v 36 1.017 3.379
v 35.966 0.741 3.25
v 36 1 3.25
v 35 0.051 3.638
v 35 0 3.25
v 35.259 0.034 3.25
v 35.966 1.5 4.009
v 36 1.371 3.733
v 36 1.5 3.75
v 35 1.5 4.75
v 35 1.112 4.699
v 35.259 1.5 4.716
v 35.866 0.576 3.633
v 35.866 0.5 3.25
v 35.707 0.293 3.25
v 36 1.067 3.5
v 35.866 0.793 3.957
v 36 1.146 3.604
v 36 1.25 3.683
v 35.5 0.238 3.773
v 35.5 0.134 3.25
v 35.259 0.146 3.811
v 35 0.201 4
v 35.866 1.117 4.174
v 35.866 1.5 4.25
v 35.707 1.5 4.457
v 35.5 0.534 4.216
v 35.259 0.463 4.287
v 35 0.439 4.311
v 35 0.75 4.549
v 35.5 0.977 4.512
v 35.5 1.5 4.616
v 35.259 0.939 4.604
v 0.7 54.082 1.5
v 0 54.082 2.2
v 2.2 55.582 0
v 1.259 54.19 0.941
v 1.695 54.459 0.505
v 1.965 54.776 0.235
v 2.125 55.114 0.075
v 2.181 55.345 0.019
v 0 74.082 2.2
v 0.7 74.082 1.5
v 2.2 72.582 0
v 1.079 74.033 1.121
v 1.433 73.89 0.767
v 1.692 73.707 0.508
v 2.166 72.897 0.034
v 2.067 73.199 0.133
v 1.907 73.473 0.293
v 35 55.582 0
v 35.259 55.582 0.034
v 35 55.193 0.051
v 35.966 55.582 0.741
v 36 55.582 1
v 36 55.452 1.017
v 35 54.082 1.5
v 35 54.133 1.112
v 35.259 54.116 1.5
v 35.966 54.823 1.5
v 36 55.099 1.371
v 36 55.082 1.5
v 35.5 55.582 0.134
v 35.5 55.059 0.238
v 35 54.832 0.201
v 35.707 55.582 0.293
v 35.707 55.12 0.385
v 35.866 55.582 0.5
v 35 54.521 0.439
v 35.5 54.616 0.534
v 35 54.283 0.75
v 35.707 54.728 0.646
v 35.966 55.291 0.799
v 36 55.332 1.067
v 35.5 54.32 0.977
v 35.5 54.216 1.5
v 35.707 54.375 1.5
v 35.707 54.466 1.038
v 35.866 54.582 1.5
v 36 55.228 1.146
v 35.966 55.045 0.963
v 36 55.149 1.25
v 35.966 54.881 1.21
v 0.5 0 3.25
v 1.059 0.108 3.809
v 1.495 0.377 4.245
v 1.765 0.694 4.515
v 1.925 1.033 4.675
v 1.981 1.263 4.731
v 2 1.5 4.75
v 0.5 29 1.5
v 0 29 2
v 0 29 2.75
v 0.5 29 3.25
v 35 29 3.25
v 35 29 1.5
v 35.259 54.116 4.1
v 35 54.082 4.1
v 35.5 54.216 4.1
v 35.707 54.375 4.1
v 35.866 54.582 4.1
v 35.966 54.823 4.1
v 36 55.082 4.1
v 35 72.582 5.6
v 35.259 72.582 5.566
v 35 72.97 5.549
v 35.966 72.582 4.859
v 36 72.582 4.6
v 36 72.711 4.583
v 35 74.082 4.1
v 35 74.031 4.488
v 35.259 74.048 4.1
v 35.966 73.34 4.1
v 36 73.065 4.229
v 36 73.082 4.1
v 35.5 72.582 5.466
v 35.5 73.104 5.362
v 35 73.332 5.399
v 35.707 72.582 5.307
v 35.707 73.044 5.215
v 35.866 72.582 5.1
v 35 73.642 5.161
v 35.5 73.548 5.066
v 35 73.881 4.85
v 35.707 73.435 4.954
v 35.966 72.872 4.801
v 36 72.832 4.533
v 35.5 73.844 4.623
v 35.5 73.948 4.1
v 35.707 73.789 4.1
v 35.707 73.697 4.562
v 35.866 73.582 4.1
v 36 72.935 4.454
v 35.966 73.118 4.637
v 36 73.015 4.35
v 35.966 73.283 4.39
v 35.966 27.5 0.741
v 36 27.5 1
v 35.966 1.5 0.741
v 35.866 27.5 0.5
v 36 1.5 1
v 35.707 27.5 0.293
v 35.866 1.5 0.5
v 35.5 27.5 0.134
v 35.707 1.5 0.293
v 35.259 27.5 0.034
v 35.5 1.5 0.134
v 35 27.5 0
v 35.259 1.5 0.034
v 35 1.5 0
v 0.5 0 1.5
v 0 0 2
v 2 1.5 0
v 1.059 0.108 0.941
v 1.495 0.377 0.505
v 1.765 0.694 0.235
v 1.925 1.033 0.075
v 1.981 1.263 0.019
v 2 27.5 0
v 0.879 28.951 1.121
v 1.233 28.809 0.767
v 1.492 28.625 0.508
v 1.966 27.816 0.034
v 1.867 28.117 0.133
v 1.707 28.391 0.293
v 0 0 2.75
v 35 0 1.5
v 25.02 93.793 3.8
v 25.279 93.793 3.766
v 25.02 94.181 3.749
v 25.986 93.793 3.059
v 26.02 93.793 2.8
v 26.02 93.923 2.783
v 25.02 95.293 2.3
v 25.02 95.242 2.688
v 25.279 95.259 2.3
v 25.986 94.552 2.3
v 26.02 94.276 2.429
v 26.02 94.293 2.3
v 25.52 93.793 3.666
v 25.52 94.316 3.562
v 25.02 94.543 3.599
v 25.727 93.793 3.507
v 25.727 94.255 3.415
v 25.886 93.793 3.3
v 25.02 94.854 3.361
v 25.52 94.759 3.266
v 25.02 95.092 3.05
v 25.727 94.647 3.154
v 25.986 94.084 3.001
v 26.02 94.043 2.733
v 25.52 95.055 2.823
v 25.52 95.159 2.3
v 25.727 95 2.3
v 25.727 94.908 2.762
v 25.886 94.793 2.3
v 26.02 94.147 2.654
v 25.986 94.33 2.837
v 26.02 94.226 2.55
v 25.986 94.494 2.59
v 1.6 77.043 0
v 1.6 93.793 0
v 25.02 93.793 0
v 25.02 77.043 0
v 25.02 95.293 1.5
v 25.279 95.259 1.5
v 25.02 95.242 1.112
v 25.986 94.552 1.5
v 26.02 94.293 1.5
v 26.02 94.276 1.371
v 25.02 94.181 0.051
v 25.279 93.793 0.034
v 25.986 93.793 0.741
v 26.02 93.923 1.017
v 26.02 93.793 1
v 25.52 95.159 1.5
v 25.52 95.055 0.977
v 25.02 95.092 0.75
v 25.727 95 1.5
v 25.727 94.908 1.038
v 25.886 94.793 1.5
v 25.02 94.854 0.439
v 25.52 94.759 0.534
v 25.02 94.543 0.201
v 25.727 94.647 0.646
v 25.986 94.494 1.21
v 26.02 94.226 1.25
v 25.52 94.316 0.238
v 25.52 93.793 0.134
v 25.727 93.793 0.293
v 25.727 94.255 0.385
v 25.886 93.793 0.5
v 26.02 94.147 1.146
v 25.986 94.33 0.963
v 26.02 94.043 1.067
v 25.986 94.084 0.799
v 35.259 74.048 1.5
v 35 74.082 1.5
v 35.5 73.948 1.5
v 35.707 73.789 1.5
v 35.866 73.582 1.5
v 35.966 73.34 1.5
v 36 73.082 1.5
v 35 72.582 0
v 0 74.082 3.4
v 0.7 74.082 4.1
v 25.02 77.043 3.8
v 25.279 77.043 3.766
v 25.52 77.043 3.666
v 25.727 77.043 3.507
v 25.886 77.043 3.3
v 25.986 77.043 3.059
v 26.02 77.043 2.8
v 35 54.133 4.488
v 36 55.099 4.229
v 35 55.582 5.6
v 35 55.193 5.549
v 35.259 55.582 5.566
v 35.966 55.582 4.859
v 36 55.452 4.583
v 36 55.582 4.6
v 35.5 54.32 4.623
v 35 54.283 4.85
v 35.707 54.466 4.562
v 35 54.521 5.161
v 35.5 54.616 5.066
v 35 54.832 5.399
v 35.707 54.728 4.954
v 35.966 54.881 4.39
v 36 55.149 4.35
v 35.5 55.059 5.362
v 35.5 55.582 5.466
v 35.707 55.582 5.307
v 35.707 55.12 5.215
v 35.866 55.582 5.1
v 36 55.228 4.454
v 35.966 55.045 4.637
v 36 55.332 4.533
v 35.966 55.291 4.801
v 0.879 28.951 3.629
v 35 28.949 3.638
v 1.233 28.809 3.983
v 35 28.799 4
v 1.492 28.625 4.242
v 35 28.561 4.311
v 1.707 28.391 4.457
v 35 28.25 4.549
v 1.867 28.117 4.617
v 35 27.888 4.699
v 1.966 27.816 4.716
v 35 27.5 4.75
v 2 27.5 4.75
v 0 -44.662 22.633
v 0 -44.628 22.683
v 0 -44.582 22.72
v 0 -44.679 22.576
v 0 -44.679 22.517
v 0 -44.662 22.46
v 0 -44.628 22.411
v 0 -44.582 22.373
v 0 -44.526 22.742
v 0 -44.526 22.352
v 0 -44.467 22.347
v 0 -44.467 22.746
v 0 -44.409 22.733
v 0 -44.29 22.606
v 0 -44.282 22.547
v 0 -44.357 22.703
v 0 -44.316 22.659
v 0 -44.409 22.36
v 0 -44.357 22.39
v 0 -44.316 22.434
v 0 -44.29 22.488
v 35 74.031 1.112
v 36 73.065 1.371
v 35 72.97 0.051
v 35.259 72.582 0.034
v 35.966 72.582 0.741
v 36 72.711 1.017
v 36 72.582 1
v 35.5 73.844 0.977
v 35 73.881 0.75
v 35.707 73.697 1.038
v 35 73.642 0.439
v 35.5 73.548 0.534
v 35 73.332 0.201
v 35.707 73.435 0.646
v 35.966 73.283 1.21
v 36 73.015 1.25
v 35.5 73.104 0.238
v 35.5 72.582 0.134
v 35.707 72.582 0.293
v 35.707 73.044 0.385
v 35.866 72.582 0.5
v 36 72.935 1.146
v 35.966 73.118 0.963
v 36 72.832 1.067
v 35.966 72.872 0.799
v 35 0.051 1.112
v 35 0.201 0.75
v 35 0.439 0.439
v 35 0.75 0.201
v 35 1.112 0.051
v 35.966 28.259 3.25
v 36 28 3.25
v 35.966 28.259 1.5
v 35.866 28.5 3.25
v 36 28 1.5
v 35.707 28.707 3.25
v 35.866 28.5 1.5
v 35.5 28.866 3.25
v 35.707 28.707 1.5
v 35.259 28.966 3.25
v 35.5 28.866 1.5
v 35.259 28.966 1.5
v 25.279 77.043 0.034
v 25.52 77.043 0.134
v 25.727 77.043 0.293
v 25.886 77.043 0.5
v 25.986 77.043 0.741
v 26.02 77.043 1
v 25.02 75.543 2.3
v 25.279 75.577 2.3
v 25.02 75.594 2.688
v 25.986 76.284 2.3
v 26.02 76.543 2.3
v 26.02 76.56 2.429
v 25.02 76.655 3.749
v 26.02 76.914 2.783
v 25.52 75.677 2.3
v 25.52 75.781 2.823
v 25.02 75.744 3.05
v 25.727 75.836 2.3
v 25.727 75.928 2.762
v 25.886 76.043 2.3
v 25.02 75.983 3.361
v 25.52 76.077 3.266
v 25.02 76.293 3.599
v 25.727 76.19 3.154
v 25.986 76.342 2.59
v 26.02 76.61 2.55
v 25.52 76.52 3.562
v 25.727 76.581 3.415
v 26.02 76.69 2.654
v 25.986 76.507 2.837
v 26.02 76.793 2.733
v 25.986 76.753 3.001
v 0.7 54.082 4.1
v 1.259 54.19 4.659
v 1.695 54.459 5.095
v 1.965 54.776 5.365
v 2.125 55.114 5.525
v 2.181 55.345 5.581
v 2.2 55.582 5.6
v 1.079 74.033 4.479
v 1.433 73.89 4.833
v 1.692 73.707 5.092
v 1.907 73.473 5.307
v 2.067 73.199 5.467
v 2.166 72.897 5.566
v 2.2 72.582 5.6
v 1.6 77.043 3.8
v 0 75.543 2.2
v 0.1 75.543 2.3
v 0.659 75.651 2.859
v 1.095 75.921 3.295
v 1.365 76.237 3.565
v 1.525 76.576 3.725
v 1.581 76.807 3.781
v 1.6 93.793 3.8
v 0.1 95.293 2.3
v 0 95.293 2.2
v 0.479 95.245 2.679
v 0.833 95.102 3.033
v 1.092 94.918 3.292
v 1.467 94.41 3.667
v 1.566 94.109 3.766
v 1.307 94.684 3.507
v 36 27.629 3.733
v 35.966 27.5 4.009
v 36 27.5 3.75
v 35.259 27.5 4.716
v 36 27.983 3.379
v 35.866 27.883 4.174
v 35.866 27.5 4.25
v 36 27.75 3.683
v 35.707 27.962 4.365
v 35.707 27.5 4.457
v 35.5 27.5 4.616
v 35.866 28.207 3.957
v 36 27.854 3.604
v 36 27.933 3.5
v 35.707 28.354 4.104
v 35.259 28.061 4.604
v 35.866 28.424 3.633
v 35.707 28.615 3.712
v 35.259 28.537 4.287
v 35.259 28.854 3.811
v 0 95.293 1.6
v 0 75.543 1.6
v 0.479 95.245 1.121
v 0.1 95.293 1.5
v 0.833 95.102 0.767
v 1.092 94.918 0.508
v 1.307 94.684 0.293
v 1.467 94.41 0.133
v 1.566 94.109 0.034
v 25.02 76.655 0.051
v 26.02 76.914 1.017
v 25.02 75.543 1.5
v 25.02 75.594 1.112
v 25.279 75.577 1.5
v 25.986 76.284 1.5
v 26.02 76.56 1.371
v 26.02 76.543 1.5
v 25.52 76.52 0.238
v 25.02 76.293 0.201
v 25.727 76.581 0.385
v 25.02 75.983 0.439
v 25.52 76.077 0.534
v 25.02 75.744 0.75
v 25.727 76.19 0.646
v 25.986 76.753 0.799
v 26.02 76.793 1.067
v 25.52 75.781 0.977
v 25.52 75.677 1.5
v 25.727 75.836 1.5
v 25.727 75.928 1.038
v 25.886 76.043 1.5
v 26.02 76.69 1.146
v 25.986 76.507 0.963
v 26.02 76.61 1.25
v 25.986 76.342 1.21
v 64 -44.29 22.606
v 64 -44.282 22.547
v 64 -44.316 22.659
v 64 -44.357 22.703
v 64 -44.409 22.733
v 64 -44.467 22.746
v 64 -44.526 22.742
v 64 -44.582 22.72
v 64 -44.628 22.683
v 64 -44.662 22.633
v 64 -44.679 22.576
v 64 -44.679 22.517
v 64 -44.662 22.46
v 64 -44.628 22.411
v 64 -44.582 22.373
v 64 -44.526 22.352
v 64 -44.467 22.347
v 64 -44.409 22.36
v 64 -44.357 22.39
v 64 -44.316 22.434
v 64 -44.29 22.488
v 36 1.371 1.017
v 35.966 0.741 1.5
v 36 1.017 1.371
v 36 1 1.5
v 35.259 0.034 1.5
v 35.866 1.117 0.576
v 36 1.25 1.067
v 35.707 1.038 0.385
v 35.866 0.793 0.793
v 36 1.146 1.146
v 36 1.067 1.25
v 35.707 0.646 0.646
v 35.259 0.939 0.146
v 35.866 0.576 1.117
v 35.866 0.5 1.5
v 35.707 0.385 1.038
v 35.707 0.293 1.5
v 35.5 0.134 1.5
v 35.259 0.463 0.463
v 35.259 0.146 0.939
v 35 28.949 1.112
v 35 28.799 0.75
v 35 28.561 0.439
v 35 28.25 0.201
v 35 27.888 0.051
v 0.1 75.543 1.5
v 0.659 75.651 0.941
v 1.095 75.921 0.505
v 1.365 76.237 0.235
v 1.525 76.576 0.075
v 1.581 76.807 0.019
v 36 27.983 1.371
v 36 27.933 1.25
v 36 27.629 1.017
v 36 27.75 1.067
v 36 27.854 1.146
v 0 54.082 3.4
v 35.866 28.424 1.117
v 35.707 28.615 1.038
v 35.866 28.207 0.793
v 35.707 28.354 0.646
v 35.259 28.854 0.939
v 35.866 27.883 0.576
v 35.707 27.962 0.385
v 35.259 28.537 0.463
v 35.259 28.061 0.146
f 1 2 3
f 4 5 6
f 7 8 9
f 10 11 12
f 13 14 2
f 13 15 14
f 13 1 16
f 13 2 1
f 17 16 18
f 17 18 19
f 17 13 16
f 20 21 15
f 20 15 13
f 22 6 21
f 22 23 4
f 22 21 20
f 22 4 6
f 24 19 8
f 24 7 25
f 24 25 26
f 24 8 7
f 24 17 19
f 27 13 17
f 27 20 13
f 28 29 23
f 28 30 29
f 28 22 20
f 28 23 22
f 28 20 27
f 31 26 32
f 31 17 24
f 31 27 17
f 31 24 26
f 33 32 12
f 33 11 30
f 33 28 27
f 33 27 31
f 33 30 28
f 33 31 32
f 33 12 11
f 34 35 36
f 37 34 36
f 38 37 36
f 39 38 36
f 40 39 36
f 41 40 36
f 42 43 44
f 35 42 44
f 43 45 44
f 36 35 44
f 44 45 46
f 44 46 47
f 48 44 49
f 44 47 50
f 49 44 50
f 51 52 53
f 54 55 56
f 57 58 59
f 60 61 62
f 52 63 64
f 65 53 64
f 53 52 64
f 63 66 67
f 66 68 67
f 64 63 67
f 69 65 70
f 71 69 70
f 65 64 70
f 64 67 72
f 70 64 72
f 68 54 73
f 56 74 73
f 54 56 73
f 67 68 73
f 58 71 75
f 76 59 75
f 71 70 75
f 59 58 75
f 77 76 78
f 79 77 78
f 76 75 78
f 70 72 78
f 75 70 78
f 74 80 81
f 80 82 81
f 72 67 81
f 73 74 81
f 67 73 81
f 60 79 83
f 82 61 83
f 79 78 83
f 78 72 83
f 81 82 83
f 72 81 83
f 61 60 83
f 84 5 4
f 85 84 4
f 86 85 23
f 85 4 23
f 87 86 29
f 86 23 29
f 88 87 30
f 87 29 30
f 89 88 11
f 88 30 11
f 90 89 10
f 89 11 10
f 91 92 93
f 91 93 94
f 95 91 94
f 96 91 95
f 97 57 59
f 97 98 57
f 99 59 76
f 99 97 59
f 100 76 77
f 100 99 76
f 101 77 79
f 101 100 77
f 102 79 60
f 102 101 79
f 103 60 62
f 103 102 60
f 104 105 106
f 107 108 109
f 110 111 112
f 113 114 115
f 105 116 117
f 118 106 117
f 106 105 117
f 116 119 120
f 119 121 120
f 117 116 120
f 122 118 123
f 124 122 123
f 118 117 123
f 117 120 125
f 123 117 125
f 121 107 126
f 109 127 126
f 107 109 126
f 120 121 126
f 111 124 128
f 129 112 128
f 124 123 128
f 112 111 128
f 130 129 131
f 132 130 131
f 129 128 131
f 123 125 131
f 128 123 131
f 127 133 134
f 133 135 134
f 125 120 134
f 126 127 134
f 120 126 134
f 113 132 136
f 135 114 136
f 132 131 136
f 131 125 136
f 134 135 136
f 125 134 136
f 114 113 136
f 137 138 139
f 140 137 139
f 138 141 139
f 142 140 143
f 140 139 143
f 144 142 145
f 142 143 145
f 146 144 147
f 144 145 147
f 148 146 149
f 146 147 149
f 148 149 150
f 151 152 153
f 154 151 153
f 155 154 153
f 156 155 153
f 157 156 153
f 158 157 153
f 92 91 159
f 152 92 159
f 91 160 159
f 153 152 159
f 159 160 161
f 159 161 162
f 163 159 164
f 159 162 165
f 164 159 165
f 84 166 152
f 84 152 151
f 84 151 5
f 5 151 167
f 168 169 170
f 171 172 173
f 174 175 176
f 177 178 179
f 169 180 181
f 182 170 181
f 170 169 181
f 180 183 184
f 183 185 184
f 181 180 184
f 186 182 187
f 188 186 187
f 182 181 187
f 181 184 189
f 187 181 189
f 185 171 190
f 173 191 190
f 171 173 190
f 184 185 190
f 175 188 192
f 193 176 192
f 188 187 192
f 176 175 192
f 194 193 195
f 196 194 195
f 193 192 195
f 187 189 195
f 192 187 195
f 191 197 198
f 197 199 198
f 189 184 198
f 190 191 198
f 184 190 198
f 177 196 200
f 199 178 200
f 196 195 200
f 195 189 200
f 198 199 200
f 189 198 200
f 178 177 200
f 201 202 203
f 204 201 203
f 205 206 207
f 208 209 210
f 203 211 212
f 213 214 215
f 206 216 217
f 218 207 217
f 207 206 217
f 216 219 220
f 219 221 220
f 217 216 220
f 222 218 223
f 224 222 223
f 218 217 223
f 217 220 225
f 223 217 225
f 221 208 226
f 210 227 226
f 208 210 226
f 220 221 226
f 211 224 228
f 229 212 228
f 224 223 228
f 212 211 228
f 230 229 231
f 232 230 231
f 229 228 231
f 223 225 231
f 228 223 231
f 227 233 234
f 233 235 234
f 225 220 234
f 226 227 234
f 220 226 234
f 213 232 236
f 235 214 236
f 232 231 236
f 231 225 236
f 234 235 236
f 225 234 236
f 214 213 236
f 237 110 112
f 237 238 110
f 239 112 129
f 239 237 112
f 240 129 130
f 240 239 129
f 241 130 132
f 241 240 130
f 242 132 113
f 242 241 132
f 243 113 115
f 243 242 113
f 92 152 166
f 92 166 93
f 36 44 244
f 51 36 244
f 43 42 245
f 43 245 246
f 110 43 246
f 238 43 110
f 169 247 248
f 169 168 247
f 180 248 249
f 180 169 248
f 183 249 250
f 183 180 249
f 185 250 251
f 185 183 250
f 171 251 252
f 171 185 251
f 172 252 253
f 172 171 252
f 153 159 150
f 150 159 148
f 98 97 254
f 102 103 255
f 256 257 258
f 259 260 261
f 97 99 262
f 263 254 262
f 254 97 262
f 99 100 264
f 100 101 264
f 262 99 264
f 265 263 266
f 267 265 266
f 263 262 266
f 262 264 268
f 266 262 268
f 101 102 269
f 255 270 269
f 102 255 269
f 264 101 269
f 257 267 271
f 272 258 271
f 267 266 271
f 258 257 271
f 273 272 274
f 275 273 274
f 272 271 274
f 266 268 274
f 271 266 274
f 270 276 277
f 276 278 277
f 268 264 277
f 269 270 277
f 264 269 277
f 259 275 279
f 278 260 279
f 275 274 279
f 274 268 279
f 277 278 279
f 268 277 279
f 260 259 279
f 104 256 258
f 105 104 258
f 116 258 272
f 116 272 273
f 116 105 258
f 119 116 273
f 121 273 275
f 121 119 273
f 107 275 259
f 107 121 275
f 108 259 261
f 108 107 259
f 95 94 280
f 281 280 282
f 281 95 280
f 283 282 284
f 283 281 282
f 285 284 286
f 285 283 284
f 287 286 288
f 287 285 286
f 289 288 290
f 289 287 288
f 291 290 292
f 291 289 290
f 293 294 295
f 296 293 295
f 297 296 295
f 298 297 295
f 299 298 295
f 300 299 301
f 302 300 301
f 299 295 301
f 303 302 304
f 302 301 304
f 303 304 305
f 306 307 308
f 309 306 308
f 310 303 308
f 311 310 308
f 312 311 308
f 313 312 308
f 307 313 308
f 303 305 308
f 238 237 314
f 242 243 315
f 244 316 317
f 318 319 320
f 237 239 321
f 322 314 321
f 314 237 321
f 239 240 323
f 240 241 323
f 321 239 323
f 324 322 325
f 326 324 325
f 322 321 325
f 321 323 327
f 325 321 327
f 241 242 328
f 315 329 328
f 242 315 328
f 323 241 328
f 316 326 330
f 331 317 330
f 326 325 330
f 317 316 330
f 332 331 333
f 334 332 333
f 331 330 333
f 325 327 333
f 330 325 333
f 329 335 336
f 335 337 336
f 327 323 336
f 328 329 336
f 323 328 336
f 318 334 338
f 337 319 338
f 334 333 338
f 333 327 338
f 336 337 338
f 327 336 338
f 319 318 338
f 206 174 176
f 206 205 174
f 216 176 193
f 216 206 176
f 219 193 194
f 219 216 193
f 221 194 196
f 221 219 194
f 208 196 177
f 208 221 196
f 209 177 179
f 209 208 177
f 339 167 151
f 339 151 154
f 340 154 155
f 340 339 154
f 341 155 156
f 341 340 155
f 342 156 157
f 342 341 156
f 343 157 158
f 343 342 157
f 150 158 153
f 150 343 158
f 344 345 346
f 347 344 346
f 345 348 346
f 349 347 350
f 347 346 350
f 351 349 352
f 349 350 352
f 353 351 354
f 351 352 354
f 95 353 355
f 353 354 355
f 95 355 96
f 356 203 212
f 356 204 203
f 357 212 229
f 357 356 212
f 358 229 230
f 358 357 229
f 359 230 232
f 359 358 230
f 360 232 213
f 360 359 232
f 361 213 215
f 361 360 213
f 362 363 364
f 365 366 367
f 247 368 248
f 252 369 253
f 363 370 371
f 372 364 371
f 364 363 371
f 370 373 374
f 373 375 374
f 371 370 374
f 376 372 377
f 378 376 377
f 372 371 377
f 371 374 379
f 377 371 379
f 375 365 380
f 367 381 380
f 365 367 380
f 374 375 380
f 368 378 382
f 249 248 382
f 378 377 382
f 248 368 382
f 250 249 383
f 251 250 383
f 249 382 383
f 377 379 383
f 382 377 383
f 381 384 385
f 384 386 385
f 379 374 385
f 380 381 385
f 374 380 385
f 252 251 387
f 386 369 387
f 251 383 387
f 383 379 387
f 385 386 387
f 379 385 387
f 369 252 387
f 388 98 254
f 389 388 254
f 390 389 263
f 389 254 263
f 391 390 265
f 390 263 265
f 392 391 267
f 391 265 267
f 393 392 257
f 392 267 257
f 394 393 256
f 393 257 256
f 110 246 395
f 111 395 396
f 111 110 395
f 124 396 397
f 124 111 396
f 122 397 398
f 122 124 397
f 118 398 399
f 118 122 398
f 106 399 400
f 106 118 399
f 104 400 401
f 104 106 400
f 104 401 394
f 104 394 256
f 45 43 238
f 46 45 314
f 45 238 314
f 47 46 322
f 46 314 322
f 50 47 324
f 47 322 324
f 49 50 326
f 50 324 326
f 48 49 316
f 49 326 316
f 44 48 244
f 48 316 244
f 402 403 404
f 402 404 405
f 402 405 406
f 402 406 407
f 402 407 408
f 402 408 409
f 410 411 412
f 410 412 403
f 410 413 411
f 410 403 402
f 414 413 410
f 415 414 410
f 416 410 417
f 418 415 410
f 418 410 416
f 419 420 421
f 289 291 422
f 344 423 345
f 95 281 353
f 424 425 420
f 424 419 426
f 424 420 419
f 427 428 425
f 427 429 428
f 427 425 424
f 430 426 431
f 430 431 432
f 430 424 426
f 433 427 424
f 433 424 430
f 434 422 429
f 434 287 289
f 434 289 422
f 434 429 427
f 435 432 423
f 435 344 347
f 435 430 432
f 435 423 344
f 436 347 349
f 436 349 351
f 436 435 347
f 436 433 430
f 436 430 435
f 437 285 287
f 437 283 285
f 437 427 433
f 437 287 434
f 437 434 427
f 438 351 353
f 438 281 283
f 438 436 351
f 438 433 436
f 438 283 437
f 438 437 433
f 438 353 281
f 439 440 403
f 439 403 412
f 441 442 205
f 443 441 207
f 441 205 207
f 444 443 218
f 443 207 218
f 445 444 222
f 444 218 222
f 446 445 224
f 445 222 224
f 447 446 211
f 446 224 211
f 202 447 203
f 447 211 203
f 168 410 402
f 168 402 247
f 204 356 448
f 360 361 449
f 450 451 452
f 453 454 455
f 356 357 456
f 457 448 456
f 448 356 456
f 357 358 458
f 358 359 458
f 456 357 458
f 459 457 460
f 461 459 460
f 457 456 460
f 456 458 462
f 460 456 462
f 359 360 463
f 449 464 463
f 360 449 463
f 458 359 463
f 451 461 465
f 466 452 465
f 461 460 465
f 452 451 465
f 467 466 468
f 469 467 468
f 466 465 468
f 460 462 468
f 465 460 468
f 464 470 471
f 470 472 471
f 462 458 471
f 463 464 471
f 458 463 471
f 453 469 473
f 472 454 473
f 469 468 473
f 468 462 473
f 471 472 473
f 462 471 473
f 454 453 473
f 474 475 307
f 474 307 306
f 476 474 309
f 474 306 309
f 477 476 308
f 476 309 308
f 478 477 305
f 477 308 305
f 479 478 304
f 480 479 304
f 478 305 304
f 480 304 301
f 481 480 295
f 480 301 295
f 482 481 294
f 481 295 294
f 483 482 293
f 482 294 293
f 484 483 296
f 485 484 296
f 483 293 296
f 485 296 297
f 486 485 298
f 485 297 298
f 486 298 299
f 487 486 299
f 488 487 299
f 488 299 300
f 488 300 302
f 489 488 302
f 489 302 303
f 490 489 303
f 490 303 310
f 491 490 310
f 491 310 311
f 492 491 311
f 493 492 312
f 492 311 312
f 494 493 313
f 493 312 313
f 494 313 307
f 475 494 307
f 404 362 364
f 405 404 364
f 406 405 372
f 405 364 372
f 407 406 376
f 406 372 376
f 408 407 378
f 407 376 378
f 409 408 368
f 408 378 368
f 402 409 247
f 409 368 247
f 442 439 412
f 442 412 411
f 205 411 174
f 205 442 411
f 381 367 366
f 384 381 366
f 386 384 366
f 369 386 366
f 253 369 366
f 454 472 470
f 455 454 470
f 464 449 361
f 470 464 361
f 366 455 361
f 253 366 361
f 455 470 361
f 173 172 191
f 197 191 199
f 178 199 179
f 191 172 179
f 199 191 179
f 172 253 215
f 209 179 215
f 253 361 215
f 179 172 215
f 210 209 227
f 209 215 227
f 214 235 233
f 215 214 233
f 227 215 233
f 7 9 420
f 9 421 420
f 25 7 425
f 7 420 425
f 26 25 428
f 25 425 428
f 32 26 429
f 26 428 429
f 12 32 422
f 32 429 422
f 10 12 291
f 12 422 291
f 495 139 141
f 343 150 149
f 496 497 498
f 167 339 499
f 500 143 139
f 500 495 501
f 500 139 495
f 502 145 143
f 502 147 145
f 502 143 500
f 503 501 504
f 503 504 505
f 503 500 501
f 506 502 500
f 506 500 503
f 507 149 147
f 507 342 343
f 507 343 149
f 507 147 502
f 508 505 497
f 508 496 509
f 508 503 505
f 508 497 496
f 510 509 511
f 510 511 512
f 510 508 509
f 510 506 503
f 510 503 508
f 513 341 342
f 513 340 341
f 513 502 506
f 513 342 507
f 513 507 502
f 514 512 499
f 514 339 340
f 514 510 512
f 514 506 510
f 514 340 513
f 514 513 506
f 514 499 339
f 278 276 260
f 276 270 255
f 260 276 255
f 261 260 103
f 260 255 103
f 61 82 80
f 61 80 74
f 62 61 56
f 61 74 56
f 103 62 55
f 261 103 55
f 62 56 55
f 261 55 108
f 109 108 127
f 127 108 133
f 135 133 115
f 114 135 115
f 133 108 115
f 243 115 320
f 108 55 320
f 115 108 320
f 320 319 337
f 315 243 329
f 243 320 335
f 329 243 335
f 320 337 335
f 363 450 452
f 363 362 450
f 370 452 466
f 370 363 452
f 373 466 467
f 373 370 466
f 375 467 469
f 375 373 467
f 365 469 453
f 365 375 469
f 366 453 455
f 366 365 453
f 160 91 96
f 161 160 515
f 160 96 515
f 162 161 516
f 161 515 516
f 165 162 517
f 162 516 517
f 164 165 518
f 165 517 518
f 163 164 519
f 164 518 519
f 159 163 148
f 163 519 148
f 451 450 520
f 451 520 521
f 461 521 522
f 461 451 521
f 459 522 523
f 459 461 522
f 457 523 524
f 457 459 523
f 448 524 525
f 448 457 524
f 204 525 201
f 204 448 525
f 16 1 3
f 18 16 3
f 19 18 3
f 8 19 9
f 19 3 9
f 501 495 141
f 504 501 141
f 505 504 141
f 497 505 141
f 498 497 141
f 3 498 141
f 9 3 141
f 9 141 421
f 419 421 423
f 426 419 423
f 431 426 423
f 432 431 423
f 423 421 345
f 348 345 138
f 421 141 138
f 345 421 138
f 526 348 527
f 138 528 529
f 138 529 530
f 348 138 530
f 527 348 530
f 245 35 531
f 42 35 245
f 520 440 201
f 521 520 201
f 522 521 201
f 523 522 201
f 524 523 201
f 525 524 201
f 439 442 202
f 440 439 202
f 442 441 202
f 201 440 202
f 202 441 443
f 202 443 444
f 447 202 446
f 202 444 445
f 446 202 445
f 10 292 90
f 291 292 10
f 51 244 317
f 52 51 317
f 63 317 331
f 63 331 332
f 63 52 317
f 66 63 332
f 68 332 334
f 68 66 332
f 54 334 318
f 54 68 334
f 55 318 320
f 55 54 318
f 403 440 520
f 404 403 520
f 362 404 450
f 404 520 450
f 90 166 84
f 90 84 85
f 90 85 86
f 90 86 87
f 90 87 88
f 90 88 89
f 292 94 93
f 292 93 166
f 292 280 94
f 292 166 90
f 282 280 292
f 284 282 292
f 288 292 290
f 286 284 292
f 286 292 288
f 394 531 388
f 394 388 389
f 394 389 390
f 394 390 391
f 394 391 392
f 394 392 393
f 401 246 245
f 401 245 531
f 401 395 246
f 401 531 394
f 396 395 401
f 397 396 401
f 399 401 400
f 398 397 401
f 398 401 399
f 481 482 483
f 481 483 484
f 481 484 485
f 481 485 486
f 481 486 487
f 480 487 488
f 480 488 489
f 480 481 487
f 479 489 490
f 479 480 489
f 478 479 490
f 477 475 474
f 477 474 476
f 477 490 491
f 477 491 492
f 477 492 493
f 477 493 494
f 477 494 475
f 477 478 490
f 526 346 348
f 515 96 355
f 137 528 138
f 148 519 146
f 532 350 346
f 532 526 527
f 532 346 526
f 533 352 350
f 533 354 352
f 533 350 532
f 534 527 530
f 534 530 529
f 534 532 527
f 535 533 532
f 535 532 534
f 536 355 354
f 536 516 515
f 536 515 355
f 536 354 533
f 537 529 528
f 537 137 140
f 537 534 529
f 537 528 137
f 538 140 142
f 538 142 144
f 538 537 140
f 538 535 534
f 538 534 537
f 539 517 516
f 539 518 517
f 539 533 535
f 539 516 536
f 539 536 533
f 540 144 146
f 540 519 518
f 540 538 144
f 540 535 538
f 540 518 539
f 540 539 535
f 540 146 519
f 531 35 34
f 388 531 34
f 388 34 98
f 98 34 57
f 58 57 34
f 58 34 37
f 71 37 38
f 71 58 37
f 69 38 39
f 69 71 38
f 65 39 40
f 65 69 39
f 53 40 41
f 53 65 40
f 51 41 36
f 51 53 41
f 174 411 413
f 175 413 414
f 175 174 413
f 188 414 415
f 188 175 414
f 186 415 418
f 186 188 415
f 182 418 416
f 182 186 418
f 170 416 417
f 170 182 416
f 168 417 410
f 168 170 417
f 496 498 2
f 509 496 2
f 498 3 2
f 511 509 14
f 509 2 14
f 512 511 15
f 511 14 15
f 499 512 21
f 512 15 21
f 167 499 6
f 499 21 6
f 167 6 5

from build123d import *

# Parameters (mm, degrees)
F0_W         = 36
F0_H         = 29
F1_DEPTH     = 4.75
F2_R         = 1.5
F3_T1_DEPTH  = 36.2867319519
F4_R         = 1
F5_W         = 36
F5_H         = 20
F6_DEPTH     = 5.6
F7_R         = 1.5
F8_R         = 1
F9_T1_DEPTH  = 28.3154051471
F10_W        = 26.02
F10_H        = 19.75
F11_DEPTH    = 3.8
F12_R        = 1.5
F13_R        = 1
F14_T1_DEPTH = 24.9793855615
F15_R        = 0.2
F16_DEPTH    = 64


# Not quite as in the source:
# - a fillet or chamfer that OpenCascade refuses, or shapes differently, is made with other operations: its cross-section is extruded or revolved along the edge and cut away or added


with BuildPart() as f1:
    # F0 (on Top) → F1 (new body)
    with BuildSketch(Plane.XY):
        with Locations((18, 14.5)):
            Rectangle(F0_W, F0_H)
    extrude(amount=F1_DEPTH)

    # F2
    f2_edges = [f1.edges().sort_by_distance(p)[0] for p in [
        (18, 0, 4.75),
        (18, 0, 0),
        (18, 29, 4.75),
        (18, 29, 0),
    ]]
    fillet(f2_edges, radius=F2_R)

    # F3: chamfer of 2 on 2 edges, made by hand

    # F3_s2 → F3_t1 (cut)
    with BuildSketch(Plane.XZ.offset(-32.6433659759)):
        Polygon((0, 2), (2, 0), (0, 0), align=None)
        Polygon((0, 2.75), (2, 4.75), (0, 4.75), align=None)
    extrude(amount=F3_T1_DEPTH, mode=Mode.SUBTRACT)

    # F4
    f4_edges = [f1.edges().sort_by_distance(p)[0] for p in [
        (36, 14.5, 4.75),
        (36, 14.5, 0),
    ]]
    fillet(f4_edges, radius=F4_R)


with BuildPart() as f6:
    # F5 (on Top) → F6 (new body)
    with BuildSketch(Plane.XY):
        with Locations((18, 64.0816430916)):
            Rectangle(F5_W, F5_H)
    extrude(amount=F6_DEPTH)

    # F7
    f7_edges = [f6.edges().sort_by_distance(p)[0] for p in [
        (18, 54.081643, 5.6),
        (18, 54.081643, 0),
        (18, 74.081643, 5.6),
        (18, 74.081643, 0),
    ]]
    fillet(f7_edges, radius=F7_R)

    # F8
    f8_edges = [f6.edges().sort_by_distance(p)[0] for p in [
        (36, 64.081643, 5.6),
        (36, 64.081643, 0),
    ]]
    fillet(f8_edges, radius=F8_R)

    # F9: chamfer of 2.2 on 2 edges, made by hand

    # F9_s2 → F9_t1 (cut)
    with BuildSketch(Plane.XZ.offset(-78.2393456652)):
        Polygon((0, 3.4), (2.2, 5.6), (0, 5.6), align=None)
        Polygon((0, 2.2), (2.2, 0), (0, 0), align=None)
    extrude(amount=F9_T1_DEPTH, mode=Mode.SUBTRACT)


with BuildPart() as f11:
    # F10 (on Top) → F11 (new body)
    with BuildSketch(Plane.XY):
        with Locations((13.01, 85.4182140244)):
            Rectangle(F10_W, F10_H)
    extrude(amount=F11_DEPTH)

    # F12
    f12_edges = [f11.edges().sort_by_distance(p)[0] for p in [
        (13.01, 75.543214, 3.8),
        (13.01, 75.543214, 0),
        (13.01, 95.293214, 3.8),
        (13.01, 95.293214, 0),
    ]]
    fillet(f12_edges, radius=F12_R)

    # F13
    f13_edges = [f11.edges().sort_by_distance(p)[0] for p in [
        (26.02, 85.418214, 3.8),
        (26.02, 85.418214, 0),
        (26.02, 95.293214, 1.9),
        (26.02, 94.853874, 0.43934),
        (26.02, 94.853874, 3.36066),
        (26.02, 75.982554, 0.43934),
        (26.02, 75.982554, 3.36066),
        (26.02, 75.543214, 1.9),
    ]]
    fillet(f13_edges, radius=F13_R)

    # F14: chamfer of 1.6 on 2 edges, made by hand

    # F14_s2 → F14_t1 (cut)
    with BuildSketch(Plane.XZ.offset(-97.9079068052)):
        Polygon((0, 2.2), (1.6, 3.8), (0, 3.8), align=None)
        Polygon((0, 1.6), (1.6, 0), (0, 0), align=None)
    extrude(amount=F14_T1_DEPTH, mode=Mode.SUBTRACT)


with BuildPart() as f16:
    # F15 (on Right) → F16 (new body)
    with BuildSketch(Plane.YZ):
        with Locations((-44.4816090167, 22.5465968251)):
            Circle(F15_R)
    extrude(amount=F16_DEPTH)


solid = Compound([f1.part, f6.part, f11.part, f16.part])
